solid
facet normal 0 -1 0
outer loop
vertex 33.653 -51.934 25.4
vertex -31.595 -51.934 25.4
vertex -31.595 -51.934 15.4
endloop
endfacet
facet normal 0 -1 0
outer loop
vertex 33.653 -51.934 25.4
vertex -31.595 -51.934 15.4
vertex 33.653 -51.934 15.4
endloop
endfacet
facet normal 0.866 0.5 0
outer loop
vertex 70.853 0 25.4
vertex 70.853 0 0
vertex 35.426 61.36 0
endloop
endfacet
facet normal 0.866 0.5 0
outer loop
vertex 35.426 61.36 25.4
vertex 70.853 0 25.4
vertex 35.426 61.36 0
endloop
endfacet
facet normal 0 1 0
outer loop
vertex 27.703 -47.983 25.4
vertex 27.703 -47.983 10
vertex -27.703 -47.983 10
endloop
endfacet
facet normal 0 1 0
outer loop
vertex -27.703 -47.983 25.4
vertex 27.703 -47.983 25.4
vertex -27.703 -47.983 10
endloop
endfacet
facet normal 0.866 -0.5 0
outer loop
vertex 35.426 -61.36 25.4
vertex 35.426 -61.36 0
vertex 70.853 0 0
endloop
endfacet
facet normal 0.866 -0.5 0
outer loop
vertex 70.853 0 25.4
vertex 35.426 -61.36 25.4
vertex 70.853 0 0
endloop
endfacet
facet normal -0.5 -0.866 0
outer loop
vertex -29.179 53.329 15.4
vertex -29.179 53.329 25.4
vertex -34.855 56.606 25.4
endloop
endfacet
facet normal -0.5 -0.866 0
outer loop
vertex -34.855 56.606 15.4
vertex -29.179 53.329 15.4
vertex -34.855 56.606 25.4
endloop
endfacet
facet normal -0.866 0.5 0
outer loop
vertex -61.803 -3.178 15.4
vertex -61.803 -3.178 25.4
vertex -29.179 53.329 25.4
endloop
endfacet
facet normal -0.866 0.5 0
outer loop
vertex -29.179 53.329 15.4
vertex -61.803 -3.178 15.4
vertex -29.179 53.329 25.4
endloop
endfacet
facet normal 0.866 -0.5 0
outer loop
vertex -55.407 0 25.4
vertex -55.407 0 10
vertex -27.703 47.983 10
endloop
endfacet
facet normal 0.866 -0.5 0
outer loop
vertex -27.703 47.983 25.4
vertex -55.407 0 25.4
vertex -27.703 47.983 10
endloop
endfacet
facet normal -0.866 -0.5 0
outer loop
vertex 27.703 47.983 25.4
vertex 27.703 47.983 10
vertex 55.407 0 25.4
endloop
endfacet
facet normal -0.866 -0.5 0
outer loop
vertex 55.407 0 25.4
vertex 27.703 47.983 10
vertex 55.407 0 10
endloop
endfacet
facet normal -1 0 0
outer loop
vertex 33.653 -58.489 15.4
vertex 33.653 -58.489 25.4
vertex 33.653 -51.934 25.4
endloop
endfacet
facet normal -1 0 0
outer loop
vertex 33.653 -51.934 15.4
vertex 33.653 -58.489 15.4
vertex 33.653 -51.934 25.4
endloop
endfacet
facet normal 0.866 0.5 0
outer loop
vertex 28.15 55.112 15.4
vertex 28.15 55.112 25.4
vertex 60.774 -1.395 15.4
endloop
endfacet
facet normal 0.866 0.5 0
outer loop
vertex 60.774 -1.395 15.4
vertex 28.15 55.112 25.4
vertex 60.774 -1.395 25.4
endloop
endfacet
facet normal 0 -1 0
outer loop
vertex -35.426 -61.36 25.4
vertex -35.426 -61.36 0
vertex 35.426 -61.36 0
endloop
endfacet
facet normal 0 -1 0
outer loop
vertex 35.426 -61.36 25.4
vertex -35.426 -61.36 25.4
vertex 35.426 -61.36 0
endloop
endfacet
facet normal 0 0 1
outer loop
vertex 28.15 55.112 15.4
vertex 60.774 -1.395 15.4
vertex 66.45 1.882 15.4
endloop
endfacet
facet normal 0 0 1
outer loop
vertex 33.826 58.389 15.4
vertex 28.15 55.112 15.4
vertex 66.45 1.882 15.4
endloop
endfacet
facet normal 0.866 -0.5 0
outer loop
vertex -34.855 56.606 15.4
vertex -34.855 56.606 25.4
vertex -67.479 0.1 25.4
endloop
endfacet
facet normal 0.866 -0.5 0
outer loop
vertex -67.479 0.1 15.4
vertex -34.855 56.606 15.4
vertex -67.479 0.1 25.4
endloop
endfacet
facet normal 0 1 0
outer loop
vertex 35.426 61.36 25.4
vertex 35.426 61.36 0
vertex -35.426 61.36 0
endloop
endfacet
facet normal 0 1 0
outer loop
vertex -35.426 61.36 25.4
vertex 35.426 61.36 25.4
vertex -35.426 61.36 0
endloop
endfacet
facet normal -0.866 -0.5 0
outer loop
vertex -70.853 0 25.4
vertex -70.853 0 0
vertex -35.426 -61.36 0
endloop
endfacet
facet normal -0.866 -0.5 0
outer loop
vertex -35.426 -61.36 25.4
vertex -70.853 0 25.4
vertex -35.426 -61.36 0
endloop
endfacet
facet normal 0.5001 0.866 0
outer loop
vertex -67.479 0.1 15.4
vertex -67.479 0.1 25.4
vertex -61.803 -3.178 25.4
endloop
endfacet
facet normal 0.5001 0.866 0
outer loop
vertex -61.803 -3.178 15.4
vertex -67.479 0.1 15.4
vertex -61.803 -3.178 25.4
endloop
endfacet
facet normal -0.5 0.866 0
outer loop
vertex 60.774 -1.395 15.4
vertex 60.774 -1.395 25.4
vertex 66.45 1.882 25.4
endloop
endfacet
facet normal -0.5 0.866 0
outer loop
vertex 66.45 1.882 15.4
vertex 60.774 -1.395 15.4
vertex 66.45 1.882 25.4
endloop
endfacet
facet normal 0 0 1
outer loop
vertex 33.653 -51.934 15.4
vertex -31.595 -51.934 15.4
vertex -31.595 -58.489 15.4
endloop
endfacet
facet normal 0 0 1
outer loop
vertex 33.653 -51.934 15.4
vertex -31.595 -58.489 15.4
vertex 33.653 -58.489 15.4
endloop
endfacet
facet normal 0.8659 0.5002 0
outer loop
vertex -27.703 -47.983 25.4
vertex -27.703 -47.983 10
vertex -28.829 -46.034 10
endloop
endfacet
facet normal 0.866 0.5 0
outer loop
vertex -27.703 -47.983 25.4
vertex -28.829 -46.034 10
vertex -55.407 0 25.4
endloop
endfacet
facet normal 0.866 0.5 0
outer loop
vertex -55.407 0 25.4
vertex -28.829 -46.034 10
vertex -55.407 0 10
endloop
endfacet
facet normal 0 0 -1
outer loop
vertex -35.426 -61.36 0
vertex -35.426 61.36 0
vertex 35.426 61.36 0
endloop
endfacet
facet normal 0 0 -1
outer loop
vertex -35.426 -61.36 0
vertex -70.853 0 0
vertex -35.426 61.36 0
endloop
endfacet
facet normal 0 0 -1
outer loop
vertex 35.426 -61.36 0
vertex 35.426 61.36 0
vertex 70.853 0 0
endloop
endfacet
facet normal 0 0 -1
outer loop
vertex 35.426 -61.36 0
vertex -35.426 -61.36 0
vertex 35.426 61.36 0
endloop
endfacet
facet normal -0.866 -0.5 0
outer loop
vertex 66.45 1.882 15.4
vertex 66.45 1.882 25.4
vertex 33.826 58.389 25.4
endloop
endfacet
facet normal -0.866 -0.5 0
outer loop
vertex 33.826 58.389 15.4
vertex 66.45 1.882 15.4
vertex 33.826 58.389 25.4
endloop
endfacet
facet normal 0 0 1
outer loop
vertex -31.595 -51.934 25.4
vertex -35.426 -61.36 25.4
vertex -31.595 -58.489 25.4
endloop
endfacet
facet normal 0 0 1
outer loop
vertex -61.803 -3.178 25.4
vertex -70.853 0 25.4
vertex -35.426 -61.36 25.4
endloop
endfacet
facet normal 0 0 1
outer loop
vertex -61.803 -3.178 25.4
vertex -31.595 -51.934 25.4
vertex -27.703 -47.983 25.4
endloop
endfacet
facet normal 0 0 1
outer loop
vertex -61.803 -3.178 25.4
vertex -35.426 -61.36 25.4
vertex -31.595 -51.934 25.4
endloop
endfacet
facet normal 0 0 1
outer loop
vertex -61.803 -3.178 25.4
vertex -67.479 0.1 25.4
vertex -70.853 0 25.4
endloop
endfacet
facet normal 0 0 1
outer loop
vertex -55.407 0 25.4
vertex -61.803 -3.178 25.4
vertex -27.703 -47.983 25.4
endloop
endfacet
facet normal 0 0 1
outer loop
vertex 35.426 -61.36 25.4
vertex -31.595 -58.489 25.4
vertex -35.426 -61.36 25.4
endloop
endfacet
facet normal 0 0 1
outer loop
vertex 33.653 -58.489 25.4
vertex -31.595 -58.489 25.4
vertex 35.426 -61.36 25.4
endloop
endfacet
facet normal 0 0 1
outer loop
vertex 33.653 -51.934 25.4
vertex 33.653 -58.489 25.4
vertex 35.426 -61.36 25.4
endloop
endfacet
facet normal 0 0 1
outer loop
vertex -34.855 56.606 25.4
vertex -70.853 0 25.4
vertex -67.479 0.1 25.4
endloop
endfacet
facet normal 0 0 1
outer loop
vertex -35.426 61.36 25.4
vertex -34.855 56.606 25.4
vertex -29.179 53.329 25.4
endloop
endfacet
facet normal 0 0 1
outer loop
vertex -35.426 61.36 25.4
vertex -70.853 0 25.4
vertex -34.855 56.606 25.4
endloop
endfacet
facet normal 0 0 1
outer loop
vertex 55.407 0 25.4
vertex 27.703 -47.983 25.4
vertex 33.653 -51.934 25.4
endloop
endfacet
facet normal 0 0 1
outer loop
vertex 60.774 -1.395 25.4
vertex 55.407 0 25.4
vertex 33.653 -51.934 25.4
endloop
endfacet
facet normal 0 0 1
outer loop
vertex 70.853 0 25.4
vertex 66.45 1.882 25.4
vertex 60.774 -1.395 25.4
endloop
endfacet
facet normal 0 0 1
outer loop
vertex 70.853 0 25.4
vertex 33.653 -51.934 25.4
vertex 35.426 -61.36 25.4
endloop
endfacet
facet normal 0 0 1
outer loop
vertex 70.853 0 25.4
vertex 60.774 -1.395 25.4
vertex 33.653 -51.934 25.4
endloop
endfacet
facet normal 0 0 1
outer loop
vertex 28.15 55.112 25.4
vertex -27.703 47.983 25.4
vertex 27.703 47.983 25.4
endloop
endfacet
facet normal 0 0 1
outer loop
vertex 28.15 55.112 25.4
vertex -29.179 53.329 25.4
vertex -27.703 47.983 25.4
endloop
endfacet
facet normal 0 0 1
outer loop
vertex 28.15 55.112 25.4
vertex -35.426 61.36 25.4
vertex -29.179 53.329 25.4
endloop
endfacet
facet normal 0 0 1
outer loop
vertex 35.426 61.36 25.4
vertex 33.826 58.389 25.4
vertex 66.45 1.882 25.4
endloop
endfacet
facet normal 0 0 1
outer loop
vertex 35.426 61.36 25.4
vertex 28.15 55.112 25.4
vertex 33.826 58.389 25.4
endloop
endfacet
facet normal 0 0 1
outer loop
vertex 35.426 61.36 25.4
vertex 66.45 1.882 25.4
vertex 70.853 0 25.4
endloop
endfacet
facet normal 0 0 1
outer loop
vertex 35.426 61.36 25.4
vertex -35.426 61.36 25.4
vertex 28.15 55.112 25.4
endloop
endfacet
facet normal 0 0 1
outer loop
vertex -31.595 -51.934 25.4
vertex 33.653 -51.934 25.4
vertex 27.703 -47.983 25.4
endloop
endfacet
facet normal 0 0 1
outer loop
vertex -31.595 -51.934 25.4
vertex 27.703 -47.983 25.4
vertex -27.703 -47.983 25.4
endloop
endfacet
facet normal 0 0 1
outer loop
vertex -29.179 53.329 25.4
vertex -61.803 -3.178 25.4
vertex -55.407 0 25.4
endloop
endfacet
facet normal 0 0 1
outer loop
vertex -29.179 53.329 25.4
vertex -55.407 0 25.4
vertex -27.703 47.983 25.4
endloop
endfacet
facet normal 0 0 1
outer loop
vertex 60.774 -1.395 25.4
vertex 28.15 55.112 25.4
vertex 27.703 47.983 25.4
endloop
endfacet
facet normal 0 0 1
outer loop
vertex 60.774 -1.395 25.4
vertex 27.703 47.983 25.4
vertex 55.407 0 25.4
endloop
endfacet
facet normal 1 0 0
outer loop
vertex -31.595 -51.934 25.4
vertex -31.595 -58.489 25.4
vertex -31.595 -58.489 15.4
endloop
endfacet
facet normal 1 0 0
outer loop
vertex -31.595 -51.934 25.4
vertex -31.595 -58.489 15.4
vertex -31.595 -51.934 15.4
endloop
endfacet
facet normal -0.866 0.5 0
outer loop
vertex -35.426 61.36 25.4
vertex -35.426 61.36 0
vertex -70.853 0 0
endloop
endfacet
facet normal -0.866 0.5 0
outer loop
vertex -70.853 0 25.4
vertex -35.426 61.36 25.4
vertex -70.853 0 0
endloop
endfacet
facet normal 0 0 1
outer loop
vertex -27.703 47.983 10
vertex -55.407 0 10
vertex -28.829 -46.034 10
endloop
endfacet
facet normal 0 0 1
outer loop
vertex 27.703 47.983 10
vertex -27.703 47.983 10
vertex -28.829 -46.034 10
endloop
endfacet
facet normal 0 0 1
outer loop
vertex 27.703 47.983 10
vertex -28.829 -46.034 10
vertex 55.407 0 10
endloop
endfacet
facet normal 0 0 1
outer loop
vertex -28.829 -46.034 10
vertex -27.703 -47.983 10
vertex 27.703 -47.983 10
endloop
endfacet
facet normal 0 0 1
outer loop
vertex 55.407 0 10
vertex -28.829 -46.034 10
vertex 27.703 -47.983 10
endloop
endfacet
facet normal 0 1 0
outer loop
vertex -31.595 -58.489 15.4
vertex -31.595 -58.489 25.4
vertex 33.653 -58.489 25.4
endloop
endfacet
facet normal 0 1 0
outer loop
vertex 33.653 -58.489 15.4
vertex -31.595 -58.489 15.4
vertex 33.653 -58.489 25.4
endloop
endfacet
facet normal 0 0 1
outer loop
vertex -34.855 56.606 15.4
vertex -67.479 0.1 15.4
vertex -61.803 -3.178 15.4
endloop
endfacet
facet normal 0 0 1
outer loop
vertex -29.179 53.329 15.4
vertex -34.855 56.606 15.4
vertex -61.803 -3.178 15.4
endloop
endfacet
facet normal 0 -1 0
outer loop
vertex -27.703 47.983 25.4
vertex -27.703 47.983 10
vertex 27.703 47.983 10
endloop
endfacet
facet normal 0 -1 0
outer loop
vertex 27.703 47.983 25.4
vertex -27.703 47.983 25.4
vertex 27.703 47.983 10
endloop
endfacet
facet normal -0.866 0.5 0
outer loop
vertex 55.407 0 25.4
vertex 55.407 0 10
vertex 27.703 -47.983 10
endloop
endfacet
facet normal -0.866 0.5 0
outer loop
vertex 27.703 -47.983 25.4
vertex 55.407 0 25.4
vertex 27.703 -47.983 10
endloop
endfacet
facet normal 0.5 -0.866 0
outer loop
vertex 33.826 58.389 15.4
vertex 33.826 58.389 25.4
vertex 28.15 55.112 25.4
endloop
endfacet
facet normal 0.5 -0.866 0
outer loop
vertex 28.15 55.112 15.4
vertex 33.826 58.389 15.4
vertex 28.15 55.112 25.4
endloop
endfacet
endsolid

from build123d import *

# Parameters (mm, degrees)
F1_DEPTH = 25.4
F2_W     = 65.248069
F2_H     = 6.554596
F3_DEPTH = 10
F5_DEPTH = 10


with BuildPart() as f1:
    # F0 (on Top) → F1 (new body)
    with BuildSketch(Plane.XY):
        Polygon((35.426364, 61.360262), (-35.426364, 61.360262), (-70.852728, 0), (-35.426364, -61.360262), (35.426364, -61.360262), (70.852728, 0), align=None)
        Polygon((-55.406566, 0), (-27.703283, 47.983494), (27.703283, 47.983494), (55.406566, 0), (27.703283, -47.983494), (-27.703283, -47.983494), align=None, mode=Mode.SUBTRACT)
    extrude(amount=F1_DEPTH)

    # F2 (on face) → F3 (cut)
    with BuildSketch(Plane.XY.offset(25.4)):
        Polygon((66.450043, 1.882416), (33.826009, 58.388901), (28.149562, 55.111603), (60.773597, -1.394882), align=None)
        with Locations((1.029233, -55.211335)):
            Rectangle(F2_W, F2_H)
        Polygon((-34.855242, 56.606218), (-67.479276, 0.099733), (-61.802829, -3.177565), (-29.178795, 53.32892), align=None)
    extrude(amount=-F3_DEPTH, mode=Mode.SUBTRACT)

    # F4 (on face) → F5 (join)
    with BuildSketch(Plane(origin=(0, 0, 0), x_dir=(1, 0, 0), z_dir=(0, 0, -1))):
        Polygon((27.703283, 47.983494), (-27.703283, 47.983494), (-28.828688, 46.034235), (-55.406566, 0), (-27.703283, -47.983494), (27.703283, -47.983494), (55.406566, 0), align=None)
    extrude(amount=-F5_DEPTH)


solid = f1.part
